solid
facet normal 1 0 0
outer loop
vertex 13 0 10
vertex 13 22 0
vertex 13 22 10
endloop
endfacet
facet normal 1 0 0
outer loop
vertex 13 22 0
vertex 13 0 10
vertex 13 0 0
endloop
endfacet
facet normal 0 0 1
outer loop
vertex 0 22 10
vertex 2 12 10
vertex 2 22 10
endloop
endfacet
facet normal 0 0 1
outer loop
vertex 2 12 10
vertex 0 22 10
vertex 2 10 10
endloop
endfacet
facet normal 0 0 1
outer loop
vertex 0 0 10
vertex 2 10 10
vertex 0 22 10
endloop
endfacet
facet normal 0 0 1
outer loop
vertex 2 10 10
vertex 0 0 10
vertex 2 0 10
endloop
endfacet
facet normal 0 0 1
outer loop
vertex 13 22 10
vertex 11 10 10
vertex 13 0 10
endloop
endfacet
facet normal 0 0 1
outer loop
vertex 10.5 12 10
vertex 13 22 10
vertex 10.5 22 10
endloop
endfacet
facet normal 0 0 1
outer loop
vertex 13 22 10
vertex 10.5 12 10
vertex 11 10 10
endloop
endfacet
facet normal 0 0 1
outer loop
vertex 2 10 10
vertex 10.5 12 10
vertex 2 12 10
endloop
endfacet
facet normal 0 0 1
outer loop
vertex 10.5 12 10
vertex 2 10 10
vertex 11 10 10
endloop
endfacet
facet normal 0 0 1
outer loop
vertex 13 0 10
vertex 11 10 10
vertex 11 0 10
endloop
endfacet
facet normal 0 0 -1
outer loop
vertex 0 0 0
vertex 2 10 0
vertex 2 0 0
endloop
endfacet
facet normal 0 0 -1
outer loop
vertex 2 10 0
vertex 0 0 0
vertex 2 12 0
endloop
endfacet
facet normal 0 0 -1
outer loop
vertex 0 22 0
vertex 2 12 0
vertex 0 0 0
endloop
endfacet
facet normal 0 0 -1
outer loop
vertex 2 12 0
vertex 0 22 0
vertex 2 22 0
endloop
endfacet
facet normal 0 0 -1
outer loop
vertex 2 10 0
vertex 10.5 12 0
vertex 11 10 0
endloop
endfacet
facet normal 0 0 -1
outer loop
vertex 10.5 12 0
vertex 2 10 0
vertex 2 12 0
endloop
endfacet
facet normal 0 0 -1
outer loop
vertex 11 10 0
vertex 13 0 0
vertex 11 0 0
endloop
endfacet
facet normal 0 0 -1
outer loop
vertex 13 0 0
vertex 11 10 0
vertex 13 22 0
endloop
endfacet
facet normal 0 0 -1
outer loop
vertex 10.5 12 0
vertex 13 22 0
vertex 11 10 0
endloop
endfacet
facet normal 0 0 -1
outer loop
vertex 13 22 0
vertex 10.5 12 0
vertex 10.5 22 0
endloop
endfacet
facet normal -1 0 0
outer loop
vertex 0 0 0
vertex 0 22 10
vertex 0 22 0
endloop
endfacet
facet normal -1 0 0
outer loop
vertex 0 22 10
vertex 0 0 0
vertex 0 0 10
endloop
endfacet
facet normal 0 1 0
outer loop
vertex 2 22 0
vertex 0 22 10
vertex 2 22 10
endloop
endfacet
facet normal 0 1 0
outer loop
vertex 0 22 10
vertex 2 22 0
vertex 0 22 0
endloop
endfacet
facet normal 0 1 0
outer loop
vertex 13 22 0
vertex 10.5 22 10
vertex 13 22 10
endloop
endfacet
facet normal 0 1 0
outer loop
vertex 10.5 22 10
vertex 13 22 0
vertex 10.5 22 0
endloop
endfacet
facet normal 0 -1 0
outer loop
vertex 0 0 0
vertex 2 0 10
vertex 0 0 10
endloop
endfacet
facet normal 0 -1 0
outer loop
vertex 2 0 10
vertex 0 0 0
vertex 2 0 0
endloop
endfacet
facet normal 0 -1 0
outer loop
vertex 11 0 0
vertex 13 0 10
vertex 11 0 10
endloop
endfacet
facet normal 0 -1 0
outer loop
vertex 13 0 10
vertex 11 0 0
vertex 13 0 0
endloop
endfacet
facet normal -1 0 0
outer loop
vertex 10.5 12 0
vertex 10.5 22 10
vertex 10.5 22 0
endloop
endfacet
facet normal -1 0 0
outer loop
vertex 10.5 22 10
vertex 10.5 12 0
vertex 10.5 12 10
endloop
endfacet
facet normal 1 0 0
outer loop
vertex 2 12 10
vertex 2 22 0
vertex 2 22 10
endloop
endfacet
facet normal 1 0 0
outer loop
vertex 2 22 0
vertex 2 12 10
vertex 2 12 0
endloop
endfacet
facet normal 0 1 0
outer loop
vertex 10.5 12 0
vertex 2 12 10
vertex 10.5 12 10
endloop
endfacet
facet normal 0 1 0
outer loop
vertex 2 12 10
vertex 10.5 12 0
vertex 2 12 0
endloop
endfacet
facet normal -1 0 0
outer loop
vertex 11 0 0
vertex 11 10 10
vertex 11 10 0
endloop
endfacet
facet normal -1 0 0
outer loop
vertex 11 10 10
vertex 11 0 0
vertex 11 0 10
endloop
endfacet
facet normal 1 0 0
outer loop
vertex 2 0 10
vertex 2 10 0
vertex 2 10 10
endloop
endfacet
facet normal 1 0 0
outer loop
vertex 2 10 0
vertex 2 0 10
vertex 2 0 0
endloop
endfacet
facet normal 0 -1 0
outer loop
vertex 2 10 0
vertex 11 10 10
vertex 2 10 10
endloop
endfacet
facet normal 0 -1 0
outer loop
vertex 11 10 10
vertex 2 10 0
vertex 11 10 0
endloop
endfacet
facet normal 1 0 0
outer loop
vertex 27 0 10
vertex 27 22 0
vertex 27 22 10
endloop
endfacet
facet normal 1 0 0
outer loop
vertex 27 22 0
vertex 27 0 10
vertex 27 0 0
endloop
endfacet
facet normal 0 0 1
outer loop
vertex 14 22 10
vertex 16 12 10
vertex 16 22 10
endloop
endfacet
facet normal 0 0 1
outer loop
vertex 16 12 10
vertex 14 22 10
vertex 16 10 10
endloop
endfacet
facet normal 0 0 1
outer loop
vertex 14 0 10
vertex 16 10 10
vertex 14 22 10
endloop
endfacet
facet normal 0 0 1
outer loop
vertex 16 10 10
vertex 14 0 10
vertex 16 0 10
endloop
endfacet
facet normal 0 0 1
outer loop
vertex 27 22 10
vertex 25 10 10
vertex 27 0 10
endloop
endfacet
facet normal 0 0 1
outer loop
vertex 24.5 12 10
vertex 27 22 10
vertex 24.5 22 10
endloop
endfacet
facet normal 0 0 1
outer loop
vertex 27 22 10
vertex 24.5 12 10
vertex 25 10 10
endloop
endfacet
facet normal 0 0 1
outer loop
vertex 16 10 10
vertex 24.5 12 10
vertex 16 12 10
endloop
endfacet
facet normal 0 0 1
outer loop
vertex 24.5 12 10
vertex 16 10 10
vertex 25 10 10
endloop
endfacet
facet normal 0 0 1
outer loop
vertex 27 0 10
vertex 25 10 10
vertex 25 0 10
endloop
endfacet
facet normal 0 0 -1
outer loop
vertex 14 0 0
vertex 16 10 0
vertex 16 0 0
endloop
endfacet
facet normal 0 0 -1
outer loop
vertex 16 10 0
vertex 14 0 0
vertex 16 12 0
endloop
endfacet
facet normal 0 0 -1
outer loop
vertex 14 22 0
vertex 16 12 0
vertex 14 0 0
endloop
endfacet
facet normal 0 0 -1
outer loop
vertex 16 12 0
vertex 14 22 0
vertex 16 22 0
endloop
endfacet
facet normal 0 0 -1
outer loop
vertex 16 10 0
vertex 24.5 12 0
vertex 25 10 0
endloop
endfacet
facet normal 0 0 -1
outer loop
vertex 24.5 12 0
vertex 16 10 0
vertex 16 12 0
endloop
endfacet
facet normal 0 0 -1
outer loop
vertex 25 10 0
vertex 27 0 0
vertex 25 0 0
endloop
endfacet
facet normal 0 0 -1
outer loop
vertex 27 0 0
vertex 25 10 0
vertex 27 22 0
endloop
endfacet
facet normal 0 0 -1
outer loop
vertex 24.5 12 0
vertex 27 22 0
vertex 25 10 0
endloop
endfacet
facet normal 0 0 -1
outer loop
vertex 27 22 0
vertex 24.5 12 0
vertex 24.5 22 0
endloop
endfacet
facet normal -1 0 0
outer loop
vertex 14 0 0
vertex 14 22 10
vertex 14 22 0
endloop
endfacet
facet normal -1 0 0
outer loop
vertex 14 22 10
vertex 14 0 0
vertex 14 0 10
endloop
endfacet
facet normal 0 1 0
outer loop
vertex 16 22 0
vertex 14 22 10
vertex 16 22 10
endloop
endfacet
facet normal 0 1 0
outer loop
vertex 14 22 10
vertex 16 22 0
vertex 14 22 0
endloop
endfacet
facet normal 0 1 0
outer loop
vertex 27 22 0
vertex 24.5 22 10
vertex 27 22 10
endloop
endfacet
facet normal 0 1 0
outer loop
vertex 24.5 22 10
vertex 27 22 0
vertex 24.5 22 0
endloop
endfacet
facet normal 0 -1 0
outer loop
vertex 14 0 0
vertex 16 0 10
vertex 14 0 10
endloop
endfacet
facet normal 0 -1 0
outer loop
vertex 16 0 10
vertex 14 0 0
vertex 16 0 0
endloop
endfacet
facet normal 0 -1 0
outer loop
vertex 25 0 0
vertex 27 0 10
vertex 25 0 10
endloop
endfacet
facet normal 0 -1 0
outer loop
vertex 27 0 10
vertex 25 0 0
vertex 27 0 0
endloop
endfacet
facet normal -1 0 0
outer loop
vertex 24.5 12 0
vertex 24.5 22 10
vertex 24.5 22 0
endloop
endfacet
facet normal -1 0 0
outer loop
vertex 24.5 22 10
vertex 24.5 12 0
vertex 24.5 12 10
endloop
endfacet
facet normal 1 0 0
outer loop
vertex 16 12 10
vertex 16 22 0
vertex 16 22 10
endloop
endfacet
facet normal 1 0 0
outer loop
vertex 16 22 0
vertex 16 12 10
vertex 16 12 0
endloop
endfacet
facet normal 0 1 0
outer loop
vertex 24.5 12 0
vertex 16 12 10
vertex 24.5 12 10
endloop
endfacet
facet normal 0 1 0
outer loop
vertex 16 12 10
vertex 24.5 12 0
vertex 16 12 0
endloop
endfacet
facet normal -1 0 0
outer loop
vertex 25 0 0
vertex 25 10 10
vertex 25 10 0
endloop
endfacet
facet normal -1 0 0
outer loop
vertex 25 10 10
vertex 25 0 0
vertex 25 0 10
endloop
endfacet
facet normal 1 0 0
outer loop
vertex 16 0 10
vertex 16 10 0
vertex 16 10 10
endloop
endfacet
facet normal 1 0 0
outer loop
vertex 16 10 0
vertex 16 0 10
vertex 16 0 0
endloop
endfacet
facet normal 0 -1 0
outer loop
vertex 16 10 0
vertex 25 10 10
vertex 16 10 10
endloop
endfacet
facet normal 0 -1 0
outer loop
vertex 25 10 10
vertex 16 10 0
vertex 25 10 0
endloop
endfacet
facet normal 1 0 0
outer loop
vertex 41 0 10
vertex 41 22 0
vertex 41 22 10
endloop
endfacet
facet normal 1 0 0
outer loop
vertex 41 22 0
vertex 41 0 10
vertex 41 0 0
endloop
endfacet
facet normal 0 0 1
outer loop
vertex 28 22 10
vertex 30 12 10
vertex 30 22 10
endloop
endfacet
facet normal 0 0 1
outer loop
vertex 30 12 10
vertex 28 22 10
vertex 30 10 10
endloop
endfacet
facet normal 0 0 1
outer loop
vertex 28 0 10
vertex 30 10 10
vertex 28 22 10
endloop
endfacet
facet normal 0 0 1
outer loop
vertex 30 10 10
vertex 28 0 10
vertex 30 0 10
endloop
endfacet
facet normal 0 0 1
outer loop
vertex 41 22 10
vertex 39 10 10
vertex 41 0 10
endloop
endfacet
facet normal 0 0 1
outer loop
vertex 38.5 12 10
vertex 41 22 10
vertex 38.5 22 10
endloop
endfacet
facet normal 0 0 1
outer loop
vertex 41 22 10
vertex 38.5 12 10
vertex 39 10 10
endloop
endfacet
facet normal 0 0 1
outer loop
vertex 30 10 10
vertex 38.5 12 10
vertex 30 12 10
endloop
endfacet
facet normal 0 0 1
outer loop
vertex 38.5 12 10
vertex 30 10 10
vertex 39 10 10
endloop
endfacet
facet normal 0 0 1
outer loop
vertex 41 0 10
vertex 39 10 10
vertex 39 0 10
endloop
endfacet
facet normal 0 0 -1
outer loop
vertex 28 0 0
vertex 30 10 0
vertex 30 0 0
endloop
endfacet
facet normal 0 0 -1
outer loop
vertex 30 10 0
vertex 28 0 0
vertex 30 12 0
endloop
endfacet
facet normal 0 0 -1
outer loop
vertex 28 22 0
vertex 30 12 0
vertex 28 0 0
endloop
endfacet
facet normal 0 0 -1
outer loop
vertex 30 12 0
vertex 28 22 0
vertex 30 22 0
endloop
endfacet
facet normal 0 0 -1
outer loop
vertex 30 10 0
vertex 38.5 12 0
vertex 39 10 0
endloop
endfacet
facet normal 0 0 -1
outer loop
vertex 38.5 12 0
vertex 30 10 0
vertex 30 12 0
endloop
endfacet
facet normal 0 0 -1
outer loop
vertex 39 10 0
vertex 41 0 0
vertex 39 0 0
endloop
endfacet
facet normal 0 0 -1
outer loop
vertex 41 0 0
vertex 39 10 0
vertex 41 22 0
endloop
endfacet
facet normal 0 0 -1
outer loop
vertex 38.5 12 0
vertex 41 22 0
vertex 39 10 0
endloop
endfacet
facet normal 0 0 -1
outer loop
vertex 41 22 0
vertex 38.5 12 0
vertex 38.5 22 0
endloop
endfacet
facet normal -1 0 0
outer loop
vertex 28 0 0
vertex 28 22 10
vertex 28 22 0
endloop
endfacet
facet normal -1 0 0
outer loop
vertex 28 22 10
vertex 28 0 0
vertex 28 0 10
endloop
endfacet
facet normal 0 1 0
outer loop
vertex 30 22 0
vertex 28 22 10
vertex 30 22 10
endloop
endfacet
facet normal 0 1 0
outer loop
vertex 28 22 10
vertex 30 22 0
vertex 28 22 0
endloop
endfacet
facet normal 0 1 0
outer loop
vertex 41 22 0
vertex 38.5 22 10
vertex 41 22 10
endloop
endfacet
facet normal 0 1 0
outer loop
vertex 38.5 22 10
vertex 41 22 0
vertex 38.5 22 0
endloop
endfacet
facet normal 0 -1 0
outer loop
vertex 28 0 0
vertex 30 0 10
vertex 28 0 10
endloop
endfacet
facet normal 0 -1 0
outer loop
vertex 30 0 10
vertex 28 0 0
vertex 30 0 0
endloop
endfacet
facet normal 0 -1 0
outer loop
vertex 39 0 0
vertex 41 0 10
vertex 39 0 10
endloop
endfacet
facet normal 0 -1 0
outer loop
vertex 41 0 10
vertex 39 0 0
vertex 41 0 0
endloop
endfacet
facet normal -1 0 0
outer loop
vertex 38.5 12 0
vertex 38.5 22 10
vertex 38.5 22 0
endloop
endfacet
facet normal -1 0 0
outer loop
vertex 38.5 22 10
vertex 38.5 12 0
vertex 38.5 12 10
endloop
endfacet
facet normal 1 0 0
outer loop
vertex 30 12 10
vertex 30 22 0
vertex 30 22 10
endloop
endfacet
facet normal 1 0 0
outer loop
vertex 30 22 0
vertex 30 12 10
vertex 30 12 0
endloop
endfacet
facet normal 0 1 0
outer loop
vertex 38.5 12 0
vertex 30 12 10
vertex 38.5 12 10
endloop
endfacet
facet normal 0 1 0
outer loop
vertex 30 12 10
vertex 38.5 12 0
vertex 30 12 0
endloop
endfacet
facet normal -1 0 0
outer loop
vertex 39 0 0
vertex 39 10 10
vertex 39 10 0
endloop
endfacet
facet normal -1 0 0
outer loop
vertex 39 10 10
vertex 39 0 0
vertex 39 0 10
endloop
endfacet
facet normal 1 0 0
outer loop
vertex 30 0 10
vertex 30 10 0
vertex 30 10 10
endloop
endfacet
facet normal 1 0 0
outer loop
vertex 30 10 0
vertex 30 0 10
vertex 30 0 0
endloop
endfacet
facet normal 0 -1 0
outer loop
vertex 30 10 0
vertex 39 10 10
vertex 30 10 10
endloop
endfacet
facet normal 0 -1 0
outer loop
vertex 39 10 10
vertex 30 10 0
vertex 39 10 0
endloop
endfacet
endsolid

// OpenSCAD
module clip()
{
  difference()
  {
    cube([2*2+9, 2*10+2, 10]);
    #translate([2, 2*10+2-10, 0])
      cube([8.5, 10, 10]);
    #translate([2, 0, 0])
      cube([9, 10, 10]);
  }
}

for(i=[0:2])
  translate(i*[14,0,0])
    clip();
